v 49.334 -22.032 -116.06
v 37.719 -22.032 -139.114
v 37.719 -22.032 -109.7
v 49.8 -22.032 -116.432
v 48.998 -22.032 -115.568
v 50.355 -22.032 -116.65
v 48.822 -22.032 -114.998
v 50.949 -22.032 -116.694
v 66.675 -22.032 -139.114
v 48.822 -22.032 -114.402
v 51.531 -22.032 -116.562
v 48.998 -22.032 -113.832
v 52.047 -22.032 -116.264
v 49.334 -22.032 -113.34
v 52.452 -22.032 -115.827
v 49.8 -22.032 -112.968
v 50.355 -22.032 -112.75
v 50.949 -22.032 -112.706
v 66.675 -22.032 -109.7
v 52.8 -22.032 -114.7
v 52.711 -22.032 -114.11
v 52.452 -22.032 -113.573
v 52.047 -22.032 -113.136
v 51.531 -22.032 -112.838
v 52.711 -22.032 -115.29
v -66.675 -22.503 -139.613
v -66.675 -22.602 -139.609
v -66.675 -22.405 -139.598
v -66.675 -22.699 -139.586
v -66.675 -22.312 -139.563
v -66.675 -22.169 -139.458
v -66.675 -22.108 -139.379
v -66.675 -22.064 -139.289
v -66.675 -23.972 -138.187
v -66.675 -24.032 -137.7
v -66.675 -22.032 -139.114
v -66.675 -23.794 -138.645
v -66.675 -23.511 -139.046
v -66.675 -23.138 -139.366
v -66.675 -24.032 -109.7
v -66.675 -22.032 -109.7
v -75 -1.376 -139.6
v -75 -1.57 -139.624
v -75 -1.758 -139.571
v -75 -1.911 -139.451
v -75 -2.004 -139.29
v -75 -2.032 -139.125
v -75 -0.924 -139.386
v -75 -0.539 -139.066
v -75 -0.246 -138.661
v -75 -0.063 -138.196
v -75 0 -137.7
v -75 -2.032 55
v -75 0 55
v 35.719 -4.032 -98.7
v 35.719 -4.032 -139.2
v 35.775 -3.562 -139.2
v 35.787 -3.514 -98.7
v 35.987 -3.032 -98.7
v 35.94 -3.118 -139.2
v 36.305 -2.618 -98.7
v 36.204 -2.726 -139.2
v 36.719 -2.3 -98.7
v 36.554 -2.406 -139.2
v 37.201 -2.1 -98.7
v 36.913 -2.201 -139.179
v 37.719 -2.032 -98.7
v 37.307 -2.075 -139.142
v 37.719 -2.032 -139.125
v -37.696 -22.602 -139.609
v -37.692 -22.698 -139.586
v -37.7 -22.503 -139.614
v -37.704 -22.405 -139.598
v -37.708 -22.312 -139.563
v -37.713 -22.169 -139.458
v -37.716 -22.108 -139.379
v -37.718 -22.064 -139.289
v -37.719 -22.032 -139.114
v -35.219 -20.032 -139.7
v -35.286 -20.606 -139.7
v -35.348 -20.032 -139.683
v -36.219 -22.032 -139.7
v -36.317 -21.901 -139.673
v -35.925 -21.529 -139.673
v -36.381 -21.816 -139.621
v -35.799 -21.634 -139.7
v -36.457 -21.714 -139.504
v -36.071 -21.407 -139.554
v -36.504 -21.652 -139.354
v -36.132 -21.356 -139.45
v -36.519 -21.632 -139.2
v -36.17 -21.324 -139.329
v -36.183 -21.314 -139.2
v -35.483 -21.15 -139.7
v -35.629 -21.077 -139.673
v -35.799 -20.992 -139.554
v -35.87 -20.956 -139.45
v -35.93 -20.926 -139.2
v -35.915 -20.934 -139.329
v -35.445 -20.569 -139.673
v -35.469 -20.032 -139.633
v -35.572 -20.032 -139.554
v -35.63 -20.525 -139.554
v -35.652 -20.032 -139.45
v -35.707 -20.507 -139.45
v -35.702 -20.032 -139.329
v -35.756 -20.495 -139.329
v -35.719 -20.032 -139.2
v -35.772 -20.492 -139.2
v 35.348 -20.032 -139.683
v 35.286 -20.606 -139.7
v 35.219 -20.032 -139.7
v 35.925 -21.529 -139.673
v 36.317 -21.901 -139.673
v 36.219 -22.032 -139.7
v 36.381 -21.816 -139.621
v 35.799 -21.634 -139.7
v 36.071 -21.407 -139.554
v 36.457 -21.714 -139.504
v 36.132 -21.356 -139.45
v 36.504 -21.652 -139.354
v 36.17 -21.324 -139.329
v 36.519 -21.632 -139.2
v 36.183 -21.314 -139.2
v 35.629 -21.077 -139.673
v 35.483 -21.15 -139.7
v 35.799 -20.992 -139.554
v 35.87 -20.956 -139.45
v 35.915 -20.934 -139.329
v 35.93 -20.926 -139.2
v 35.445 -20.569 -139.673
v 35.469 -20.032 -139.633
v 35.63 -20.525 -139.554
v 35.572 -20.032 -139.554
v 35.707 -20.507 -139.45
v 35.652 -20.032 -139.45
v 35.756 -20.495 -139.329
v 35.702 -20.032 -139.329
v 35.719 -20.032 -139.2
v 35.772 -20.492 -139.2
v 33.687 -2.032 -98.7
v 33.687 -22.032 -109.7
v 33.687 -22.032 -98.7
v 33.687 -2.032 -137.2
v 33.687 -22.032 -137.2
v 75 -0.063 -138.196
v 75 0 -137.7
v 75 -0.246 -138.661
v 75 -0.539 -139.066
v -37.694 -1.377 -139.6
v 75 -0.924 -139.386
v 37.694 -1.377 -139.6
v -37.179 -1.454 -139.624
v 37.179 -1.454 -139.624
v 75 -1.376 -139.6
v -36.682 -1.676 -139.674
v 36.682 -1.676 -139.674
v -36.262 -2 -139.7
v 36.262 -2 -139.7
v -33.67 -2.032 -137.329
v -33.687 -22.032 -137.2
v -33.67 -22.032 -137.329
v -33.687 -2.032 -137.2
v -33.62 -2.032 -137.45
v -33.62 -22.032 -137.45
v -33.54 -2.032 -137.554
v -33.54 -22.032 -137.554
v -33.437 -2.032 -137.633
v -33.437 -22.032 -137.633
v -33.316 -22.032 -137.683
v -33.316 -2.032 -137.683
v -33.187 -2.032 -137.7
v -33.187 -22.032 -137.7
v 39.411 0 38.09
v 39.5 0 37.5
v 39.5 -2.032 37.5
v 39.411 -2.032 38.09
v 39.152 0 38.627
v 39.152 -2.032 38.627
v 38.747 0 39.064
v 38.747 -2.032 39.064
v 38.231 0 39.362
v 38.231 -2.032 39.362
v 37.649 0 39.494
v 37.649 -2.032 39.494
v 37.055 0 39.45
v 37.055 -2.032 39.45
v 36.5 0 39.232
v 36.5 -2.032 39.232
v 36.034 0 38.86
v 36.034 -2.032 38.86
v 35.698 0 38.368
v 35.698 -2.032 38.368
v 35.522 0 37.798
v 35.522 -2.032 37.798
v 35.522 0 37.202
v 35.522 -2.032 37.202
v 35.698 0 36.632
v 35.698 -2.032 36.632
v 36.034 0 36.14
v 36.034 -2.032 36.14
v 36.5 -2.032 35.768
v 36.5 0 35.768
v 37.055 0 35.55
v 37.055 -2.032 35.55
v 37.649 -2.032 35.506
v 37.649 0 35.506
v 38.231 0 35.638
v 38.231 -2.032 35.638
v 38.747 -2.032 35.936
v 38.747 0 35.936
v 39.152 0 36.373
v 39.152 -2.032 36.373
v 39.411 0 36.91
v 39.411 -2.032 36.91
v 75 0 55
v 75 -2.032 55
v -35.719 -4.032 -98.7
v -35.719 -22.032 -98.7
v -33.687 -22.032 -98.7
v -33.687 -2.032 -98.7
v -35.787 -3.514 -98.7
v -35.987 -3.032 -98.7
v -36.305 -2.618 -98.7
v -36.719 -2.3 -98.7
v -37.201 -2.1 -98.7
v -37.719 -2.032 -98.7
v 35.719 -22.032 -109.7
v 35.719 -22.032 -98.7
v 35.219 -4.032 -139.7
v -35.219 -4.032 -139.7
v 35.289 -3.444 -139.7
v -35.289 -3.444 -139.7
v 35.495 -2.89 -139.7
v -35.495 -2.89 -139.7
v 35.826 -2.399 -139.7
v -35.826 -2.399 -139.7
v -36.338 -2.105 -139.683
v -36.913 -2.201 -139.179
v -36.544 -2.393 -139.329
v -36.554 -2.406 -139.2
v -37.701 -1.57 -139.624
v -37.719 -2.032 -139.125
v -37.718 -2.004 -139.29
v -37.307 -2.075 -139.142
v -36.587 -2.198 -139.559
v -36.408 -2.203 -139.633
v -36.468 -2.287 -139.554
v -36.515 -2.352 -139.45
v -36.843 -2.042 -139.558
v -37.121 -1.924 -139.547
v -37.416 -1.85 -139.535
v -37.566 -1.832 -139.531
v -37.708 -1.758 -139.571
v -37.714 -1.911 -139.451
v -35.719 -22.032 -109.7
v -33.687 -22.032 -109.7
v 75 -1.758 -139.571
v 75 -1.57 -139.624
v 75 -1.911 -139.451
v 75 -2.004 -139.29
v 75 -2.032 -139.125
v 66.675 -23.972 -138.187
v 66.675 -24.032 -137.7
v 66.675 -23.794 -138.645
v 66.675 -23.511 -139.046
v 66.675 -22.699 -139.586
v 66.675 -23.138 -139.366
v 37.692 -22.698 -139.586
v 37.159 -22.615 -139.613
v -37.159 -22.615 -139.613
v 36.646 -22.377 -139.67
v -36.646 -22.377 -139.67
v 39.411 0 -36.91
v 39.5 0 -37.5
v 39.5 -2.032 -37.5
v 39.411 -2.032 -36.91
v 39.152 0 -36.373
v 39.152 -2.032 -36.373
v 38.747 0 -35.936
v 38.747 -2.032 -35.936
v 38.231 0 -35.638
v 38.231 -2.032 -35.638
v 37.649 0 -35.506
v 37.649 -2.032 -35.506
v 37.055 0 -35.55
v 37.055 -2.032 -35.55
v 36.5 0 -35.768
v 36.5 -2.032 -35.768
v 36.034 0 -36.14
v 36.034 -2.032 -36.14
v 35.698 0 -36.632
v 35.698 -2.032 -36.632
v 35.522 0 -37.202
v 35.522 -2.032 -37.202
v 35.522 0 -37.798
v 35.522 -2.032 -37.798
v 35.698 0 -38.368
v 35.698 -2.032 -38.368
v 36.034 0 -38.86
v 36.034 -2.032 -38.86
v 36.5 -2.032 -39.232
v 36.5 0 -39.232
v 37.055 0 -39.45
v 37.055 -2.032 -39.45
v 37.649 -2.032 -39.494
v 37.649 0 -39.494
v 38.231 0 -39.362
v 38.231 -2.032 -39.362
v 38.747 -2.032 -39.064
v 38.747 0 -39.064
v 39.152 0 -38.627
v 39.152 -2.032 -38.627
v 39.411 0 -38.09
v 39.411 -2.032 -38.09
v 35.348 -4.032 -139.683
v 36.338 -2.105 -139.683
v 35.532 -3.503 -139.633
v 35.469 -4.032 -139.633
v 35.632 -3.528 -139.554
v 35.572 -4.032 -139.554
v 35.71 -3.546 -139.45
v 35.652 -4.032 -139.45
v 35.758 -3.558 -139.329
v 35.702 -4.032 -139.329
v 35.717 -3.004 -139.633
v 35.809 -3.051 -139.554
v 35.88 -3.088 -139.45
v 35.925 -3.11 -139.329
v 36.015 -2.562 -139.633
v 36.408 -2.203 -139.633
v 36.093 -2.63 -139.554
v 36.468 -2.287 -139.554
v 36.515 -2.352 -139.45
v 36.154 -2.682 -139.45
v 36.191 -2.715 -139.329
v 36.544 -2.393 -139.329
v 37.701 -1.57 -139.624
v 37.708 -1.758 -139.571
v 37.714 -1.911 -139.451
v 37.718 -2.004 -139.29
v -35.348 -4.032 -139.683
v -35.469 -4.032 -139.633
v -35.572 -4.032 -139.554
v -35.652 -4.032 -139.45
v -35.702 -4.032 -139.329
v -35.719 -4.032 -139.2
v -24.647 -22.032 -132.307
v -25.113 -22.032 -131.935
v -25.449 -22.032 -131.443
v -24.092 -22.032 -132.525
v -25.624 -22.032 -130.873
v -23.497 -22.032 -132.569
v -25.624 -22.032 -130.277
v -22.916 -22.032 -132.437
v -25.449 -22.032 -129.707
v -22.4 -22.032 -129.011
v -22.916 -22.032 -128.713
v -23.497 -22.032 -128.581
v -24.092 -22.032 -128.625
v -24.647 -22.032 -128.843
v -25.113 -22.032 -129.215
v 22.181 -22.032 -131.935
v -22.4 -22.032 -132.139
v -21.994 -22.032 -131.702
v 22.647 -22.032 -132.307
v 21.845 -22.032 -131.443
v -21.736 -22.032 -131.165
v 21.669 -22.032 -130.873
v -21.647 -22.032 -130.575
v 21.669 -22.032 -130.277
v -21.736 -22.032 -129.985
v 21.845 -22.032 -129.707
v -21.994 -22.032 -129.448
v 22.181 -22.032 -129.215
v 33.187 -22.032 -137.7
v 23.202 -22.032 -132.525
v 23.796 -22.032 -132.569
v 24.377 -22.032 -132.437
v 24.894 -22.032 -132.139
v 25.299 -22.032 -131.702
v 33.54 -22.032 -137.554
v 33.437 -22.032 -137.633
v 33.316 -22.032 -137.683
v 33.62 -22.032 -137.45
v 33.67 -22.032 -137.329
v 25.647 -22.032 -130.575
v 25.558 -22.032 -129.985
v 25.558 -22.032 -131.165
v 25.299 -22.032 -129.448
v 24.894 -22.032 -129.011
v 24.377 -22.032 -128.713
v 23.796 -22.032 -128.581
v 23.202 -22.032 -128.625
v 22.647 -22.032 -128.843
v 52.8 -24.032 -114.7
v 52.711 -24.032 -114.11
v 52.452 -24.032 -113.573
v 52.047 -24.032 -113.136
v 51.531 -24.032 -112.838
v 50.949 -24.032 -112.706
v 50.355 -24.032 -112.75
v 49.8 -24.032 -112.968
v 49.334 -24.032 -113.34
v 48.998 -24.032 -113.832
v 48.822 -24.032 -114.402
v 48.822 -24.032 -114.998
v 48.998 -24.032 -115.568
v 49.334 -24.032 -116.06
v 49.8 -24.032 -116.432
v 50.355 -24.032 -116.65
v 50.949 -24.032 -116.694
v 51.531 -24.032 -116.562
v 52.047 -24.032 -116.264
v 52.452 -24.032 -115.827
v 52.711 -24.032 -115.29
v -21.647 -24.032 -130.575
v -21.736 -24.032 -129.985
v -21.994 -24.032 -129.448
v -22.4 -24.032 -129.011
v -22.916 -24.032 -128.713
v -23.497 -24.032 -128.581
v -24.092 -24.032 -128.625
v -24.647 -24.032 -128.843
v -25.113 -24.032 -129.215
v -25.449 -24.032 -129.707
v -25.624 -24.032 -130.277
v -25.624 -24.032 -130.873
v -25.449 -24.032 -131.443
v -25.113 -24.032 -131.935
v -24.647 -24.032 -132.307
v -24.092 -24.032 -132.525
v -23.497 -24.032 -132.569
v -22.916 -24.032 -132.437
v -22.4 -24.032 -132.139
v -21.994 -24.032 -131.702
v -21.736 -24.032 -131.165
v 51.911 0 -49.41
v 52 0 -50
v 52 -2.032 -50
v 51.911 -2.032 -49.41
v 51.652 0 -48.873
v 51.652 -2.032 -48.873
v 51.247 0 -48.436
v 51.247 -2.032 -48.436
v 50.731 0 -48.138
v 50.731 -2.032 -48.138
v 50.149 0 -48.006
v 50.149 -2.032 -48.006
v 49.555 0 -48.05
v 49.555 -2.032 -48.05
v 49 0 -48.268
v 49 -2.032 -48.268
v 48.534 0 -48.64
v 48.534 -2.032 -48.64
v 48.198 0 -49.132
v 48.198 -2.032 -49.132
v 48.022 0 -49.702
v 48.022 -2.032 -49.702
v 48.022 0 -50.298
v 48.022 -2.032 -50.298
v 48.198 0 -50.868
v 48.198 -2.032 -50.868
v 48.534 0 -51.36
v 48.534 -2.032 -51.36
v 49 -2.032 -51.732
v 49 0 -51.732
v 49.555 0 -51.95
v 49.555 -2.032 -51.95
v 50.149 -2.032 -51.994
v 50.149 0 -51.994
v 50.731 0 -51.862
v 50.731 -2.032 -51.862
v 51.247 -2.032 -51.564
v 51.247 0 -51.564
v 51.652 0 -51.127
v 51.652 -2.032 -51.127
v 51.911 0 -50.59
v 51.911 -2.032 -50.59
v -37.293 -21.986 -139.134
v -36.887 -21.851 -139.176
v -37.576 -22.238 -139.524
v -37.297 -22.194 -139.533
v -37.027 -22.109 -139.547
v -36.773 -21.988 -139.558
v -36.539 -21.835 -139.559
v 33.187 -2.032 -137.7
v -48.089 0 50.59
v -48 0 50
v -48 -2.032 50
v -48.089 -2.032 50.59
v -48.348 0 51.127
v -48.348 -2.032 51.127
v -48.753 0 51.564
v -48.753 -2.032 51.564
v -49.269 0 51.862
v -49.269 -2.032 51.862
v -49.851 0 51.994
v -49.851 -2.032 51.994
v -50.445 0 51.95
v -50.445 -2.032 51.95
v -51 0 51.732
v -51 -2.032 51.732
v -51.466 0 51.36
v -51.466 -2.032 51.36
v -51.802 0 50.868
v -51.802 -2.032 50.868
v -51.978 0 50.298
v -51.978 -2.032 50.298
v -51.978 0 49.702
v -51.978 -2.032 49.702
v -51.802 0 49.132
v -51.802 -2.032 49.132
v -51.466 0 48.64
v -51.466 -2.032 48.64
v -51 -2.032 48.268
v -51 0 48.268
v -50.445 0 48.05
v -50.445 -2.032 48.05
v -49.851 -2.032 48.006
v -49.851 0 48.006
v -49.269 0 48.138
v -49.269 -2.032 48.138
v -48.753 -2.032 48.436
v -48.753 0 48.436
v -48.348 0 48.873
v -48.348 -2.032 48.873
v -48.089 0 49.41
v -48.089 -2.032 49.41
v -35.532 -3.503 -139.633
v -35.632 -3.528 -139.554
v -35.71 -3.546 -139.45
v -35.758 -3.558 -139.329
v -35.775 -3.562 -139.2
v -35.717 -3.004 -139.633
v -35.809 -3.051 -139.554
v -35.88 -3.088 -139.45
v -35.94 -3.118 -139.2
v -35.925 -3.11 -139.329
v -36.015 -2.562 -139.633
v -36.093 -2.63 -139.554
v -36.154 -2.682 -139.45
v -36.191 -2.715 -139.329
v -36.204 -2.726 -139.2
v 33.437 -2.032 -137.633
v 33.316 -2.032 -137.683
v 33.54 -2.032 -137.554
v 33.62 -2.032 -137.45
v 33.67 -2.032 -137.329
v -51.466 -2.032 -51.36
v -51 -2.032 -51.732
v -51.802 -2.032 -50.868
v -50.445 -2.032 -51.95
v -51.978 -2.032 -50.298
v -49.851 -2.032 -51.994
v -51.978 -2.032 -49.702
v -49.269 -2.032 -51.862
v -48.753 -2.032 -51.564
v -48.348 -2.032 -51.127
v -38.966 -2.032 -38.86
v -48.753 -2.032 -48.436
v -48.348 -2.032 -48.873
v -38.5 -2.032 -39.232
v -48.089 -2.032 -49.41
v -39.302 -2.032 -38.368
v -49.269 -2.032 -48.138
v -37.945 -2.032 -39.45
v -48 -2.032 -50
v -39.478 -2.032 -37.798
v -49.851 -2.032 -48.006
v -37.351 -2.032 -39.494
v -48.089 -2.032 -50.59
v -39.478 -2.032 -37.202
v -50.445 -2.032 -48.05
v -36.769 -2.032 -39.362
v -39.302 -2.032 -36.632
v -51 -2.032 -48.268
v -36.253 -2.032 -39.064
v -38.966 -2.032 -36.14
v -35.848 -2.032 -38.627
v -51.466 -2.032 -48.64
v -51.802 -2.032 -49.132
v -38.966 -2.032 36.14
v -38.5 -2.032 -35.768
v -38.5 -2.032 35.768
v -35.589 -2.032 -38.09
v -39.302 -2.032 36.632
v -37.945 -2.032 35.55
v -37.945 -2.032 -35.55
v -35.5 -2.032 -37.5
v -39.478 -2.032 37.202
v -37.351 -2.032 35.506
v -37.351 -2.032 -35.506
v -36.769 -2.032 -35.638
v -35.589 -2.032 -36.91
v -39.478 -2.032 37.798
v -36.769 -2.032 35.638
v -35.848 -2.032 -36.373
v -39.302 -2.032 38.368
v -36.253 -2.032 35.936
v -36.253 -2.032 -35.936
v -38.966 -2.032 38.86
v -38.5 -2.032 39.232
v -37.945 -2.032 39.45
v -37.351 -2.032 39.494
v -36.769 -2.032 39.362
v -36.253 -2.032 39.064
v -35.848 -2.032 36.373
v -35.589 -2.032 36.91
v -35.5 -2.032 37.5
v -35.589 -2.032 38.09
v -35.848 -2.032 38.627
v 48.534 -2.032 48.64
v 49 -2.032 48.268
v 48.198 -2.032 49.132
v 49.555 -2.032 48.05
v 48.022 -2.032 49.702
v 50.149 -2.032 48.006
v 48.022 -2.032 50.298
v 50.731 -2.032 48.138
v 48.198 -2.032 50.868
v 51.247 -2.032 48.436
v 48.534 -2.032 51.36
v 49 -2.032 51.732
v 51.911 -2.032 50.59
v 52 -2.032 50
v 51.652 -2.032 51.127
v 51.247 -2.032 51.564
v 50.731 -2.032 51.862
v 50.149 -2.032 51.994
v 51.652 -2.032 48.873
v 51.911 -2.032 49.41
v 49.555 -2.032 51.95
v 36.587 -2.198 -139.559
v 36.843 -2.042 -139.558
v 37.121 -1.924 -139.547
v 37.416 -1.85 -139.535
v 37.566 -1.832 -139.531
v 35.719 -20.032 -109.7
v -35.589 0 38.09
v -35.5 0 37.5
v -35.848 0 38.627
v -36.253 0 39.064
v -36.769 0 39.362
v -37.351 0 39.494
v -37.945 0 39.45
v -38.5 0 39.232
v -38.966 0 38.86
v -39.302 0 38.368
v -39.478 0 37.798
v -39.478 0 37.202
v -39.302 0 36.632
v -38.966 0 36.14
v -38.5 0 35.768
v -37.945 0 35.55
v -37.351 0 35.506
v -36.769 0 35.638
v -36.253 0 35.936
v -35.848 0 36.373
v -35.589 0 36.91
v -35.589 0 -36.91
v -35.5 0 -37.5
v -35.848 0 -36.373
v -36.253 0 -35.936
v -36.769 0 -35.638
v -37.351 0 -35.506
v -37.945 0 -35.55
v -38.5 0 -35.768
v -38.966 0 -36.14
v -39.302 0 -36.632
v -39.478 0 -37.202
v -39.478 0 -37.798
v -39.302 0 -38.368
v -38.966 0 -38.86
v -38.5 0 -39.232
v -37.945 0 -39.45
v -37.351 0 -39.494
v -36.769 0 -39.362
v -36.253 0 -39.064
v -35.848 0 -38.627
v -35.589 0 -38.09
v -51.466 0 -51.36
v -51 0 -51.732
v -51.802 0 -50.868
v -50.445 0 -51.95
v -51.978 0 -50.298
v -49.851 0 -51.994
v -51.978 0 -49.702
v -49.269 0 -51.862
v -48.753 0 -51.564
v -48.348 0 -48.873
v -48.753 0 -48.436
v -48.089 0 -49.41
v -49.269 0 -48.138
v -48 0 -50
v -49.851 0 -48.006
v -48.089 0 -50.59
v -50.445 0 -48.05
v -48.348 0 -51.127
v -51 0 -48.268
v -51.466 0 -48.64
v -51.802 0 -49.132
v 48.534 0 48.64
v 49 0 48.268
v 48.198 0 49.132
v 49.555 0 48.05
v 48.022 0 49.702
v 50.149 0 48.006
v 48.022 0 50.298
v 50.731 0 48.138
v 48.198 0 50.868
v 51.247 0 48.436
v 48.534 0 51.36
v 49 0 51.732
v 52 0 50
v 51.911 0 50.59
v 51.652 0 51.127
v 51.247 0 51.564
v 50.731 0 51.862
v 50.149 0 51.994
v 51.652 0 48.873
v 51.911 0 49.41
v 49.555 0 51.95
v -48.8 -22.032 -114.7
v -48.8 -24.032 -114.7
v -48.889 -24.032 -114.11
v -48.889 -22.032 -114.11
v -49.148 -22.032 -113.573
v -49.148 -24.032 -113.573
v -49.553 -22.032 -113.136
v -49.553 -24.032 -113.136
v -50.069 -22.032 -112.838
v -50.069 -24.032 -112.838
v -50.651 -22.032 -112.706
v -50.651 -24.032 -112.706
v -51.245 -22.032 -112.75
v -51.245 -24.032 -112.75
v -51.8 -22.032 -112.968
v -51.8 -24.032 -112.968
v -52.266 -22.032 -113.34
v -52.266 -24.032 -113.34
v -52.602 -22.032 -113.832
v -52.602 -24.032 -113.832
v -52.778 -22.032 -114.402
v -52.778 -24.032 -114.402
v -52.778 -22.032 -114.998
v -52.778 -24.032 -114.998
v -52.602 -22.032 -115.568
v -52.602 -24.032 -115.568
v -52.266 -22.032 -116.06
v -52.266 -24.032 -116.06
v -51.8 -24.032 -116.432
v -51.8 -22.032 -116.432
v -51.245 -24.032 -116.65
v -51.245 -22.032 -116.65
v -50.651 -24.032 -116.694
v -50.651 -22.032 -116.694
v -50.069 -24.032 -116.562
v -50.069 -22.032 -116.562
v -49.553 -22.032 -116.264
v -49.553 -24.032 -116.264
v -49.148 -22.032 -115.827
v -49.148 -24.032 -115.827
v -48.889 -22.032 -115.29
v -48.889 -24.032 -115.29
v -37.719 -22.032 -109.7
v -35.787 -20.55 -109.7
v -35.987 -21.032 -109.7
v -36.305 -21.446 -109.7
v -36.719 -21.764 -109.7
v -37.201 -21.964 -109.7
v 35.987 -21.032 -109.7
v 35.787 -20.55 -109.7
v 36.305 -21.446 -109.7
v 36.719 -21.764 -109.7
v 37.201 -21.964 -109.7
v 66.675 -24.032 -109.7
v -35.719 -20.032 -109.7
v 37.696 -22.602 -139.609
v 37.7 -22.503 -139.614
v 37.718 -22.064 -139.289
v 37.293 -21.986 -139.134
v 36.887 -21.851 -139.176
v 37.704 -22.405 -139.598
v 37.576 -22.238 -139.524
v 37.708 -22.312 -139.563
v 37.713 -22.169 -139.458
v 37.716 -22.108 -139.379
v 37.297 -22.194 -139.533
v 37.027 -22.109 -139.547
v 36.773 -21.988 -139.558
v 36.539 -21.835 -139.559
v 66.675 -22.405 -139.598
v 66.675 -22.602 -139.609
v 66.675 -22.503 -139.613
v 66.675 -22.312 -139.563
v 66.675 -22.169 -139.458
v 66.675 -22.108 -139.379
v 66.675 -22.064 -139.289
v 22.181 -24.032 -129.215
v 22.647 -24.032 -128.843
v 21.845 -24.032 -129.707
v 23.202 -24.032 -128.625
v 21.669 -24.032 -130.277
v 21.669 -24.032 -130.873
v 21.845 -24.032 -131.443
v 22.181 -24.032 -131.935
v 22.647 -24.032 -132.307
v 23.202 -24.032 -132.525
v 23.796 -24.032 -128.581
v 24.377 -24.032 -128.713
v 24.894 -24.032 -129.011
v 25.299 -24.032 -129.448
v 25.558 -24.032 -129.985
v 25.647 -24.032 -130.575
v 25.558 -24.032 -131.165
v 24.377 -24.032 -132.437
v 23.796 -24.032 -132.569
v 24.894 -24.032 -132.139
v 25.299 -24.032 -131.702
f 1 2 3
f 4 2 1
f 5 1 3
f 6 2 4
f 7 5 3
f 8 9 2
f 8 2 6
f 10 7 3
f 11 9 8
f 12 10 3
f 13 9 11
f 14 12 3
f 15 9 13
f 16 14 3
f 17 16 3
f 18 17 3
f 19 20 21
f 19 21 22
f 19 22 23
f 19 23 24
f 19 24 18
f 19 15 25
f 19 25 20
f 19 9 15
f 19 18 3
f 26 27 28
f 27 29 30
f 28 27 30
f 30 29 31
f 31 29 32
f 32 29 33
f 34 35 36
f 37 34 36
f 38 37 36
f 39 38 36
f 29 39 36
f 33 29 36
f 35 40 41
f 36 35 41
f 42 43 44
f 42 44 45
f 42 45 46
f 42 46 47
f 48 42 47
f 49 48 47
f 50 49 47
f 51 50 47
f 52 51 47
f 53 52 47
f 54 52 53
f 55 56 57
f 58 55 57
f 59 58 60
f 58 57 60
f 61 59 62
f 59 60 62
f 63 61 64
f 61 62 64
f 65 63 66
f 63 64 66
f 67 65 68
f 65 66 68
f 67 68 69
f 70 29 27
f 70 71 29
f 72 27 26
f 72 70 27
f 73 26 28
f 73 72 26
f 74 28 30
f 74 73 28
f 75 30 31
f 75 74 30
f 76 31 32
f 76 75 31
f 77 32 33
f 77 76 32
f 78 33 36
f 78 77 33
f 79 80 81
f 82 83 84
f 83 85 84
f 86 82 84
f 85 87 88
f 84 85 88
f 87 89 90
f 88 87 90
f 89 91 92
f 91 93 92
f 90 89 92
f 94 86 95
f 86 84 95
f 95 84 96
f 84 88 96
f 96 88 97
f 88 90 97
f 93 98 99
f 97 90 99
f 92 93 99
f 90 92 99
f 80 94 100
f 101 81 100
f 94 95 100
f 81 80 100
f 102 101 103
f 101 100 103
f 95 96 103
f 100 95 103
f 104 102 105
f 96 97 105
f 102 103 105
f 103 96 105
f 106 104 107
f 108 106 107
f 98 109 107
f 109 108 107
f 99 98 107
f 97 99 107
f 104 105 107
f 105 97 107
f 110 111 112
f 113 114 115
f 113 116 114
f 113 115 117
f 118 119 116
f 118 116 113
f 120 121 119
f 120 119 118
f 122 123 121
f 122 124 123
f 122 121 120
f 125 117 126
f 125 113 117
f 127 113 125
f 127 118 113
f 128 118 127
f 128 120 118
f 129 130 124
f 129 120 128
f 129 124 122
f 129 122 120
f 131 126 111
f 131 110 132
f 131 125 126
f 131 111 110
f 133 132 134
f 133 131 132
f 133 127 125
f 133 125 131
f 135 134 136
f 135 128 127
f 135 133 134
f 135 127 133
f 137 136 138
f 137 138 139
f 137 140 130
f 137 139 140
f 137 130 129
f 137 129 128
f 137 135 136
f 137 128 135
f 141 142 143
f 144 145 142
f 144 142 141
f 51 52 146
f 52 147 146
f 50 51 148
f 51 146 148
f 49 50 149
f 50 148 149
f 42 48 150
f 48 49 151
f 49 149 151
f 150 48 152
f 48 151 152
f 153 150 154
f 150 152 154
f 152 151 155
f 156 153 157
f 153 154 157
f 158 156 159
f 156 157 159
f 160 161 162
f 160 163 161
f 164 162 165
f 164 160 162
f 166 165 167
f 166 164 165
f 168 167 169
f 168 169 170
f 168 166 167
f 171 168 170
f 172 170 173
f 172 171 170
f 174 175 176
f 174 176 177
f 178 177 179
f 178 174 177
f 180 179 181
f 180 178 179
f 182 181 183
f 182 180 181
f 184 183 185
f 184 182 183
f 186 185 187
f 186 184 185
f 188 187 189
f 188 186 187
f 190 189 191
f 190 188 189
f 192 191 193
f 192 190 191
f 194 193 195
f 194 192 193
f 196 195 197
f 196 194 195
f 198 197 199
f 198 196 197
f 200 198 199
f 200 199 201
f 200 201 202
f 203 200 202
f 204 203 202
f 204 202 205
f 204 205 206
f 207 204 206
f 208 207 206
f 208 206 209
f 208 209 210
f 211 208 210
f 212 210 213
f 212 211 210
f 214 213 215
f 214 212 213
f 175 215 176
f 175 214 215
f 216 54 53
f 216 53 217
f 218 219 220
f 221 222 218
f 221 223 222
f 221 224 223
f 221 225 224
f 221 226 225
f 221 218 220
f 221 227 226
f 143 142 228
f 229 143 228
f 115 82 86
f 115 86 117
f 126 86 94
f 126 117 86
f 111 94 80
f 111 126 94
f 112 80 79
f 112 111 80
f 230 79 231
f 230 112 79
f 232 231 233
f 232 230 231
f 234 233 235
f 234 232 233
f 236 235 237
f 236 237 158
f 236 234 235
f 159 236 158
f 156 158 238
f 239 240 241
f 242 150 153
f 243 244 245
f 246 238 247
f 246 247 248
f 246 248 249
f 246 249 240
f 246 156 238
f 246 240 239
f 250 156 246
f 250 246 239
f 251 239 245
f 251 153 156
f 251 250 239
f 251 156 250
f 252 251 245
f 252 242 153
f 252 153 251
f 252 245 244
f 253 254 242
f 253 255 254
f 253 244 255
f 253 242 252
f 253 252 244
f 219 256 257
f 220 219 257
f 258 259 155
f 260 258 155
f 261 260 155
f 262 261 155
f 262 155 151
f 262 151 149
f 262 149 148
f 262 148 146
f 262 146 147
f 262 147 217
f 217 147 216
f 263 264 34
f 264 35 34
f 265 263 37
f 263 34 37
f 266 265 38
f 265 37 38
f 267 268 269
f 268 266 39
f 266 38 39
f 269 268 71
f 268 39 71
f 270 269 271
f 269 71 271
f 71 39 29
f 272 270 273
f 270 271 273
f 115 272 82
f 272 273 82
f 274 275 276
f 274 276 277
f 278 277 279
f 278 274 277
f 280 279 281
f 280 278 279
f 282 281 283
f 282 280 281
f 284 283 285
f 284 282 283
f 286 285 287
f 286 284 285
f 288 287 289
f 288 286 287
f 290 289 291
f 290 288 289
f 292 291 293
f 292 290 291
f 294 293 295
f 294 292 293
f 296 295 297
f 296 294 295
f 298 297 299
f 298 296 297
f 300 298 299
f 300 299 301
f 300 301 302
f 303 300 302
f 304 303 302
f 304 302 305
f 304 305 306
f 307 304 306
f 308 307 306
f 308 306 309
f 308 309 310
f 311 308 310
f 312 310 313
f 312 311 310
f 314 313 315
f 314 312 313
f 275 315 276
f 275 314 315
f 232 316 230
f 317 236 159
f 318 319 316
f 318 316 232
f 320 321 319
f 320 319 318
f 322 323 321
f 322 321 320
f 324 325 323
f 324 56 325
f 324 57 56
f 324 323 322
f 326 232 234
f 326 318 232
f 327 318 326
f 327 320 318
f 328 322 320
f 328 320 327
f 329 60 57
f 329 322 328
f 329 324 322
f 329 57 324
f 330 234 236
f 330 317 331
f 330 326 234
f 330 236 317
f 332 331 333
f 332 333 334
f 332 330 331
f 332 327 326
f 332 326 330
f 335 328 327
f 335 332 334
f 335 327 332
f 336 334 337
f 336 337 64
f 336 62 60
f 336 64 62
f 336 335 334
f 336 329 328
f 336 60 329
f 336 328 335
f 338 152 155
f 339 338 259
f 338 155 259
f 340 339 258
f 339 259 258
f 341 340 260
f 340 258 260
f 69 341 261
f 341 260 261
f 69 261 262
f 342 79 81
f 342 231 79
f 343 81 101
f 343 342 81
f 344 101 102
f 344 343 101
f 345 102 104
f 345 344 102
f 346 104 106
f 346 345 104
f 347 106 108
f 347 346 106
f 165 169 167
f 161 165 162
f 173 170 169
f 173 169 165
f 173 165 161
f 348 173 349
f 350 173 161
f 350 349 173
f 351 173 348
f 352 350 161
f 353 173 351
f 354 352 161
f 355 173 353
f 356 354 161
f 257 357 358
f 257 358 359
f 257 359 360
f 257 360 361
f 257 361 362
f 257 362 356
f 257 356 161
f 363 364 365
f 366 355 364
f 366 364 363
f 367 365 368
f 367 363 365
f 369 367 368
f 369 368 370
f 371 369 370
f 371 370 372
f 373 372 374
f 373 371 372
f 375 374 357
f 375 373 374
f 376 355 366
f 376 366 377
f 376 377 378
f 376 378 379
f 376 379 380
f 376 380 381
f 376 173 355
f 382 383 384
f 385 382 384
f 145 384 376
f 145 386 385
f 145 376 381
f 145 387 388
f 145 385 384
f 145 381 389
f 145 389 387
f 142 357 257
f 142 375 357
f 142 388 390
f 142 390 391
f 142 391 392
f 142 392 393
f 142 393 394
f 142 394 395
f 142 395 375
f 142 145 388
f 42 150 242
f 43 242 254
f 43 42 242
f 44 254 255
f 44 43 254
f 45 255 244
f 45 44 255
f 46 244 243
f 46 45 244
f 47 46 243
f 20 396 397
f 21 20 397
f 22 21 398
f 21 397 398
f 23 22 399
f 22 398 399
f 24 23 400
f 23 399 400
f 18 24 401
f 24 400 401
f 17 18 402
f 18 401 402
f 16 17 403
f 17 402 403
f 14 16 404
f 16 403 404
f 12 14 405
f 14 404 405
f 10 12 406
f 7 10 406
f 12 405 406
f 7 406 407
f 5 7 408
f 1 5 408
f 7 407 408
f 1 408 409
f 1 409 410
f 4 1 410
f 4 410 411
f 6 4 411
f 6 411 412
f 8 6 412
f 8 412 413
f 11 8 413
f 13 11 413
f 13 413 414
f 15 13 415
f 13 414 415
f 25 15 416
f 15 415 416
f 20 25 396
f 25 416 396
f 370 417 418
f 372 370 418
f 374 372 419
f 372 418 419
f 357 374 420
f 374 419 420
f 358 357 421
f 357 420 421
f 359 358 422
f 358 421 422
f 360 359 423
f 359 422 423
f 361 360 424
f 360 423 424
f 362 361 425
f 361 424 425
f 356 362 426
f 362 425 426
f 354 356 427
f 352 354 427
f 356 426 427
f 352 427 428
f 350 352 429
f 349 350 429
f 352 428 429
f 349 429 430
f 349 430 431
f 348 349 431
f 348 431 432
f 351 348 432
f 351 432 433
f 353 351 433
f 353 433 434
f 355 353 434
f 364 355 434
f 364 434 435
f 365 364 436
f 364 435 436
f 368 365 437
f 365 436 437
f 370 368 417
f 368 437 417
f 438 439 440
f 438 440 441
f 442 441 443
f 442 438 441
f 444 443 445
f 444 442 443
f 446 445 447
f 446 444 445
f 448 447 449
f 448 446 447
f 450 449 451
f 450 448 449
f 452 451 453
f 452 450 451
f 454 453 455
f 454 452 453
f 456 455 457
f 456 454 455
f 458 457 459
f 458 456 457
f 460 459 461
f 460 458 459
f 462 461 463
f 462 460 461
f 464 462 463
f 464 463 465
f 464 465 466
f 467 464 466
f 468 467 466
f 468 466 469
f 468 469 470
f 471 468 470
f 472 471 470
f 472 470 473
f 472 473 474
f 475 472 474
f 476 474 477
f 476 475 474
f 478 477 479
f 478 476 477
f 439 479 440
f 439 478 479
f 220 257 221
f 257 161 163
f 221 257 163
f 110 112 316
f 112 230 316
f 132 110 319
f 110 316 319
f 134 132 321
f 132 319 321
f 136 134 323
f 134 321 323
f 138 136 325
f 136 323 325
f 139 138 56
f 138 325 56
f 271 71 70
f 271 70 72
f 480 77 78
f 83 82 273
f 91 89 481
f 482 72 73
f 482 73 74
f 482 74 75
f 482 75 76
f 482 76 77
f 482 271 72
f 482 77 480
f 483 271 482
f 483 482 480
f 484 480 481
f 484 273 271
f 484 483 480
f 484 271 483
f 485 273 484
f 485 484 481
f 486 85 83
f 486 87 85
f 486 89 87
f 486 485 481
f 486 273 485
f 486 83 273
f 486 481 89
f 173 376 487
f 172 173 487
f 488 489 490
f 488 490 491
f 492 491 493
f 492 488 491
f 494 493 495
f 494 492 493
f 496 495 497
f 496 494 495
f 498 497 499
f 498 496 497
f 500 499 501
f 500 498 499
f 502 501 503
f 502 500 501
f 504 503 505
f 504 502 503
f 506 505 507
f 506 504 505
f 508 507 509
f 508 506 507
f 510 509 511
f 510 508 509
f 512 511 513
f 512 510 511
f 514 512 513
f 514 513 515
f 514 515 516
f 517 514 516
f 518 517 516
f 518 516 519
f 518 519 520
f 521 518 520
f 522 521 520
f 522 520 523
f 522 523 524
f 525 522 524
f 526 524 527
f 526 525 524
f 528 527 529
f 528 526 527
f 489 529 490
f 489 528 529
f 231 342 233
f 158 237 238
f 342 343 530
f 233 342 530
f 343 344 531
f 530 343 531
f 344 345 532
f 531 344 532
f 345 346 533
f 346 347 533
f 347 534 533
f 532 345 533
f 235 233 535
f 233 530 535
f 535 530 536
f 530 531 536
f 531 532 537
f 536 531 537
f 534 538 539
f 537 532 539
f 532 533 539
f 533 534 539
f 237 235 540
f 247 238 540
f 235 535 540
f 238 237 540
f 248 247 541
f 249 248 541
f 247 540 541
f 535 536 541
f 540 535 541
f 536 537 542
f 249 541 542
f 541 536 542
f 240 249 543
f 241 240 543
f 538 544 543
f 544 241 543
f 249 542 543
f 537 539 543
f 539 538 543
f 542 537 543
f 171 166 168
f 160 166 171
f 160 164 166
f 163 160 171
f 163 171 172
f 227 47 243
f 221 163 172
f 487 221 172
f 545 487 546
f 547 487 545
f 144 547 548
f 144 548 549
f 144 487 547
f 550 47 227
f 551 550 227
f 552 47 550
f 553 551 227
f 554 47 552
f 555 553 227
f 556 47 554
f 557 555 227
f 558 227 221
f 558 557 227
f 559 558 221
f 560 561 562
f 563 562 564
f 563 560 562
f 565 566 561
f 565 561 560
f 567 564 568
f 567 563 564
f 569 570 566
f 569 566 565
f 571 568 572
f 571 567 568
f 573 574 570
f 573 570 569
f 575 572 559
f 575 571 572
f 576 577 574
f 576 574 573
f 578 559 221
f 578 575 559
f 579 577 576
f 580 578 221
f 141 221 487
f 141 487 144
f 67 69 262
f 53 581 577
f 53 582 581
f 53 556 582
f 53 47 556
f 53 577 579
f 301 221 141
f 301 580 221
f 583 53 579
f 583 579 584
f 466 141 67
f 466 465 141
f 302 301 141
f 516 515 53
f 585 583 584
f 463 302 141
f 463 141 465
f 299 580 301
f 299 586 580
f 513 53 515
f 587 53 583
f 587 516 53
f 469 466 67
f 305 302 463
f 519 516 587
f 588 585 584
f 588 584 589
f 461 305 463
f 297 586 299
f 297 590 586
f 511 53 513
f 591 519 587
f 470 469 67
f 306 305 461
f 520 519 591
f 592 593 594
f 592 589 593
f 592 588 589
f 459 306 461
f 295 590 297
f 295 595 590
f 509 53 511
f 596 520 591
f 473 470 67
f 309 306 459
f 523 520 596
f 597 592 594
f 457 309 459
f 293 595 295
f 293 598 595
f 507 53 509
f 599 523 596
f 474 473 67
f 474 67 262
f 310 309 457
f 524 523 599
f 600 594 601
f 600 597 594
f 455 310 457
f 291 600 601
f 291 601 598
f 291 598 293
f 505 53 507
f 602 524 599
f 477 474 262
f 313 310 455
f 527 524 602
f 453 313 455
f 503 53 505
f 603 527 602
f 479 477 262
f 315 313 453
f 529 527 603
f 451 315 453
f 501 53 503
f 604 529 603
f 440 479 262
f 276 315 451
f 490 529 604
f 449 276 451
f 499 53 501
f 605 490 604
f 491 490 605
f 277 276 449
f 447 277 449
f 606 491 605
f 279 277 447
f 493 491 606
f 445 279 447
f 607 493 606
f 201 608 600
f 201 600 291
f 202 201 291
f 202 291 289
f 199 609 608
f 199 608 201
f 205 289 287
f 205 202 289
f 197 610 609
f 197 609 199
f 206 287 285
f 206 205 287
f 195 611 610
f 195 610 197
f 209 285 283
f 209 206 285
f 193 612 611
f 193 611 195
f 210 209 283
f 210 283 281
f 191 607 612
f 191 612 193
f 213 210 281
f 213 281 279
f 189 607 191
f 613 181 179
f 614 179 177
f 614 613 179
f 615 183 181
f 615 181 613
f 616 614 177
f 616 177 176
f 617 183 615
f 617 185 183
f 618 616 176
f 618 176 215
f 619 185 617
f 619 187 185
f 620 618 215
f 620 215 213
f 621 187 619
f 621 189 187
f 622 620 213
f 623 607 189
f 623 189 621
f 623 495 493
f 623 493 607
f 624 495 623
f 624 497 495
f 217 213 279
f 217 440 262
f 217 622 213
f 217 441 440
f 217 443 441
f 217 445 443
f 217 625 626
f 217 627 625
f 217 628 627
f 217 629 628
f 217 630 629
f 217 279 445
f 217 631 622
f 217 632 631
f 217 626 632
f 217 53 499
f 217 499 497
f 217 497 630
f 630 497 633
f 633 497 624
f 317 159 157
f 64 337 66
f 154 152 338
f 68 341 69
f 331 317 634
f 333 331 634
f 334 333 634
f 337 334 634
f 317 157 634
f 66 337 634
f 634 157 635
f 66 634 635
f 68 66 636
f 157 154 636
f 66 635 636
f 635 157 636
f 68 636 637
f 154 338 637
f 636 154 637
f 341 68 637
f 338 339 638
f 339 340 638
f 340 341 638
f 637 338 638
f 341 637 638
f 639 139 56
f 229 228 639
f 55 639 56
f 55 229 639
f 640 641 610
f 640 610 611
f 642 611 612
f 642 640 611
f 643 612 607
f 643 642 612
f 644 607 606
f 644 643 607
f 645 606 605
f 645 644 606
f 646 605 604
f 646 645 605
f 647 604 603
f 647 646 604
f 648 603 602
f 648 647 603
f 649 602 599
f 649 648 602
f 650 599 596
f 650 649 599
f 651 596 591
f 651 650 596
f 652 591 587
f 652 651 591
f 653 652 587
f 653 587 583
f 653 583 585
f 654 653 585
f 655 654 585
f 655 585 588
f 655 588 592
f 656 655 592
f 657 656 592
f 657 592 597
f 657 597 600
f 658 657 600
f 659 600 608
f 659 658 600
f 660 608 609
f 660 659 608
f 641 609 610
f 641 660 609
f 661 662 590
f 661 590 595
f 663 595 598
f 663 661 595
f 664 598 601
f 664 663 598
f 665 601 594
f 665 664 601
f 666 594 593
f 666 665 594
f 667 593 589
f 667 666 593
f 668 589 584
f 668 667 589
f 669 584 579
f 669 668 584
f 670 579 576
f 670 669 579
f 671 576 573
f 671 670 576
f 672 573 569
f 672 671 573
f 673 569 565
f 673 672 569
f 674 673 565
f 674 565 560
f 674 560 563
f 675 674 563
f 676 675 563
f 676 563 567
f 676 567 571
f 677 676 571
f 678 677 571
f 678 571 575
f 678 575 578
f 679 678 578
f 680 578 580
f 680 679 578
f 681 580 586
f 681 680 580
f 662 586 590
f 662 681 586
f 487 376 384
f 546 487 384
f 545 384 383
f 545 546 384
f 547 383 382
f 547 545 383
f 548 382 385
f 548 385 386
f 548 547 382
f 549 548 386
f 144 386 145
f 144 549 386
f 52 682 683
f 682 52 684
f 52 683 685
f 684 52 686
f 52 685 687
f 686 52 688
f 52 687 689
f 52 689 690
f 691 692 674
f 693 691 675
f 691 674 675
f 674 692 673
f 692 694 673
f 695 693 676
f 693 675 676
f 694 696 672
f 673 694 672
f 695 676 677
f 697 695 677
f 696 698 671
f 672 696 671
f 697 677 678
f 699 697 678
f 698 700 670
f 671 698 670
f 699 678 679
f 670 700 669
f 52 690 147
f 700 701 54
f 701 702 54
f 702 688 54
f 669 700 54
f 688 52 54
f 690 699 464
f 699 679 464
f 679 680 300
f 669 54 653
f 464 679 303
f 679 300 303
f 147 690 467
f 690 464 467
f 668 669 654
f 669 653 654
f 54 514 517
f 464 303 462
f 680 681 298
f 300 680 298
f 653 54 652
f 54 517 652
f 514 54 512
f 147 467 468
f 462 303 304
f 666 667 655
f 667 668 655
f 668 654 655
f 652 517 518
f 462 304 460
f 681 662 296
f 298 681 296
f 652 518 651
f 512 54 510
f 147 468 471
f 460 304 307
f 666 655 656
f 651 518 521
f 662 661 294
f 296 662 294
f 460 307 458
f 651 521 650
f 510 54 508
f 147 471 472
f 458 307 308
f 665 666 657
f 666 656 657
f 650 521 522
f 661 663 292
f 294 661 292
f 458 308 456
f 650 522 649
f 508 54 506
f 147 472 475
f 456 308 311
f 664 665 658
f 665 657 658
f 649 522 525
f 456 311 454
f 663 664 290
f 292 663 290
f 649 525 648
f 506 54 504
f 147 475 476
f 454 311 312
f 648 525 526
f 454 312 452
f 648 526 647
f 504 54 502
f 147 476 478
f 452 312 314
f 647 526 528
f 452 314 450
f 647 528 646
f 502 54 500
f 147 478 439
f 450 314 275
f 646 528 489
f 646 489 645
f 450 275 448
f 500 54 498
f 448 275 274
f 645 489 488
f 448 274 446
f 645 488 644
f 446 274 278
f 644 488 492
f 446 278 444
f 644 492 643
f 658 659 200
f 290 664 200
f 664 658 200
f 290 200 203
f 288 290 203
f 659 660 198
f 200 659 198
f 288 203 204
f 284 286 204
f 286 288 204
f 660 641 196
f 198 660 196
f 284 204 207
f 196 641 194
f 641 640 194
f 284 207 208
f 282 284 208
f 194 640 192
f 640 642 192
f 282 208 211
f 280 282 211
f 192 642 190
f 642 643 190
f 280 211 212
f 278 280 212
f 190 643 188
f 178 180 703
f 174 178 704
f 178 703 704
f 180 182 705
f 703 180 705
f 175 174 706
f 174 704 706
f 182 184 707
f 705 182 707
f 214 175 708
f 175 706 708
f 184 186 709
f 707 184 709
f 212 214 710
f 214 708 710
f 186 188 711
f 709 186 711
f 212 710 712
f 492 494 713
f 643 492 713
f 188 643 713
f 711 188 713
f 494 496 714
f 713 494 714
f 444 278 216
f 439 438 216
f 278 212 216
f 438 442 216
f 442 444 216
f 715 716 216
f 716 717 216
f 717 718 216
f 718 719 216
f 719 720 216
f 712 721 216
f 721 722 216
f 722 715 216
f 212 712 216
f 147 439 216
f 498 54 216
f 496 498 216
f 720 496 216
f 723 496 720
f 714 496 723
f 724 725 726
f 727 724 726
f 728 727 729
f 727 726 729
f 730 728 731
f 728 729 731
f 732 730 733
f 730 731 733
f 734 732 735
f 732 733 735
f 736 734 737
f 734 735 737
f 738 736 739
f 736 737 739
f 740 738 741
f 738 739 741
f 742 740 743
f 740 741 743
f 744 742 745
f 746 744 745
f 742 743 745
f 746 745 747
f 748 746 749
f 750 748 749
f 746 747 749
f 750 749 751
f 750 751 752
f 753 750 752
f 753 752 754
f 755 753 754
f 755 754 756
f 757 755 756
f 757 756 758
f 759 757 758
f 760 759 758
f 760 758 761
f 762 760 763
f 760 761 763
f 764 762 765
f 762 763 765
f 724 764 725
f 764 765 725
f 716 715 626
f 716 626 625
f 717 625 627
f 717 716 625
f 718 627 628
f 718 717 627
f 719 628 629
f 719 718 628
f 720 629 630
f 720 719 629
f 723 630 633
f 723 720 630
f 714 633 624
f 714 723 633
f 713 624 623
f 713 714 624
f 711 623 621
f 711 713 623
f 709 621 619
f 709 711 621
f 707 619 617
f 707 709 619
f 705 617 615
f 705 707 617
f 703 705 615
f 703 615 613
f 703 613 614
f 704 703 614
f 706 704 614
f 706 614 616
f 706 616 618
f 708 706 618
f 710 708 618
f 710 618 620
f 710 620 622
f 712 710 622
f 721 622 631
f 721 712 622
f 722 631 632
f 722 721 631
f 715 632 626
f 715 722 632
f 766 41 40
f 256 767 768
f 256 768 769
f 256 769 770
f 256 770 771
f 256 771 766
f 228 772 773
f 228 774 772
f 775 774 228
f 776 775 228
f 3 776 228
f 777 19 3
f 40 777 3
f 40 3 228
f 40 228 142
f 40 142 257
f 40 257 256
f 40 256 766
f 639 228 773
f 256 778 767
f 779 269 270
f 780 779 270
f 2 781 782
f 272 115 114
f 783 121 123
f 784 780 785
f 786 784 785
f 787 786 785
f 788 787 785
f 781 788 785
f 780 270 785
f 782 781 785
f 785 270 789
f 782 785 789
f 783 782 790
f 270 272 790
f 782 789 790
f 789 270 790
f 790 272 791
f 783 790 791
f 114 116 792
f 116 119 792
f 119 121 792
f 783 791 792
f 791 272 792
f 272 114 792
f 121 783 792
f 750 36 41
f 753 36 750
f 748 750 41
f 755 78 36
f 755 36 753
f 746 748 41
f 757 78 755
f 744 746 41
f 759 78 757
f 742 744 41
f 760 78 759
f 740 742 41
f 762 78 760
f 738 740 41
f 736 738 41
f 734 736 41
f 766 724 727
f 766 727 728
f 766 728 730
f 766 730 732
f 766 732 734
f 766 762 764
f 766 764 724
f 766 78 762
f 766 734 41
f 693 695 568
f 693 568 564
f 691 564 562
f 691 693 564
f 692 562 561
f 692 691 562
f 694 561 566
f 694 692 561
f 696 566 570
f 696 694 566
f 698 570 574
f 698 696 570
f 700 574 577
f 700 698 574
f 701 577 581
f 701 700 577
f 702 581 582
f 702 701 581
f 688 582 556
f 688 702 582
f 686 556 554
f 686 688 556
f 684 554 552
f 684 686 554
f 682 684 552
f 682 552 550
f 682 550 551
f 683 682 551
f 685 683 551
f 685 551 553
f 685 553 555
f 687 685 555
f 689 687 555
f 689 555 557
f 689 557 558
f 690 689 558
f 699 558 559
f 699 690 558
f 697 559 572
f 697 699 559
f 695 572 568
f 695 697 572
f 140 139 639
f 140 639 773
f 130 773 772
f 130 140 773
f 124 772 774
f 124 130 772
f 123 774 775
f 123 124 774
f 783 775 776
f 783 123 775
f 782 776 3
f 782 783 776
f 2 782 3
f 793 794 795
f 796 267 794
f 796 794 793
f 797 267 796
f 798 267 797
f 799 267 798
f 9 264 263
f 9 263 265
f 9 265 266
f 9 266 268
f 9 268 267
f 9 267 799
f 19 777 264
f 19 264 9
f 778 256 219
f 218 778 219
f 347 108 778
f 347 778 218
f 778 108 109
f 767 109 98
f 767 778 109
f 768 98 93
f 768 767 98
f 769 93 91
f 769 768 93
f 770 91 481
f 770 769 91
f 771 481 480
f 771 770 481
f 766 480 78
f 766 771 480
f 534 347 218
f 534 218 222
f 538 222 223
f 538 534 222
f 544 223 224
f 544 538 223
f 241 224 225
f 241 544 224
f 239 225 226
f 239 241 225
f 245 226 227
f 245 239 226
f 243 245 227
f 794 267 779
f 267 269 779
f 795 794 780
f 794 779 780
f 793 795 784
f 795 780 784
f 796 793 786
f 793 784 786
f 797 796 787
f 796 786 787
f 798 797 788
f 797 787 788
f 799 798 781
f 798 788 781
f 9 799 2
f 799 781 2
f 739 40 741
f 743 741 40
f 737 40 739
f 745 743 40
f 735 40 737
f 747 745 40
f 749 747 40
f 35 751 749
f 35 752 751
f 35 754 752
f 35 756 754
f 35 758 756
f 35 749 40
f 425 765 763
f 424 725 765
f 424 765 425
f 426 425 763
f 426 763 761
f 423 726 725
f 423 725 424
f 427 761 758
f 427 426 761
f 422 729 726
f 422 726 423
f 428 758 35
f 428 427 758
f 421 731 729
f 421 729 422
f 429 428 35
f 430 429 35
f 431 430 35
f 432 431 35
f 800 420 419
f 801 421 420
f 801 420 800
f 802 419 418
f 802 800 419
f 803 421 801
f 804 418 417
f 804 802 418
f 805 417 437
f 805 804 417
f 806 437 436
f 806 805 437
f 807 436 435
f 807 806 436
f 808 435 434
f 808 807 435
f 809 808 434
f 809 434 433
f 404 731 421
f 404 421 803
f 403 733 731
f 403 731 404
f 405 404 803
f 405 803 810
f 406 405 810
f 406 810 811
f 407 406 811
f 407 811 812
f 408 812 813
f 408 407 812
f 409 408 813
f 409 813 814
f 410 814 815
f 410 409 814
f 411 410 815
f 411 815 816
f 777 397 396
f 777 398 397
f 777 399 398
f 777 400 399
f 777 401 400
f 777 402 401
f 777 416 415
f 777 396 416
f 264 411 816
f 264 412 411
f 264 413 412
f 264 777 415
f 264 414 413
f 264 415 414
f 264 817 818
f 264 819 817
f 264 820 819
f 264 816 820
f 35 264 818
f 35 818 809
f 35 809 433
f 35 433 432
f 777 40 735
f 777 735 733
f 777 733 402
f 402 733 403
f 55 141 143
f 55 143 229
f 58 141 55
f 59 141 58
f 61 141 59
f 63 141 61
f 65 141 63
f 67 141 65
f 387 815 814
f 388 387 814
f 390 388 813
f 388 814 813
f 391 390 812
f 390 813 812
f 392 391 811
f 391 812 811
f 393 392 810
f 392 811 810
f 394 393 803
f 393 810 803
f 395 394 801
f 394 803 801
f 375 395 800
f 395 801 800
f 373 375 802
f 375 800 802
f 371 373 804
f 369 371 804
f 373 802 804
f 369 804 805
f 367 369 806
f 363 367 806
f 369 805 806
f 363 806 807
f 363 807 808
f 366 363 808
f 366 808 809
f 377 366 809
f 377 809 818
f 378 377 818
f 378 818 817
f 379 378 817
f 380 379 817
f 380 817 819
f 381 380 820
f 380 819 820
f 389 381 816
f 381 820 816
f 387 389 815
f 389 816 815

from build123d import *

# Parameters (mm, degrees)
F0_W     = 150
F0_H     = 194.7
F0_R     = 2
F1_DEPTH = 2.032
F2_W     = 20
F2_H     = 2
F3_DEPTH = 35.71875
F4_DEPTH = 66.675
F5_R     = 2
F6_DEPTH = 2
F7_W     = 2.032
F7_H     = 20
F8_DEPTH = 39
F9_R     = 2
F10_R    = 1.99999
F11_R    = 0.5


# Not quite as in the source:
# - a fillet or chamfer is up to 0.001 mm smaller than in the source, because OpenCascade refuses the exact size


with BuildPart() as f1:
    # F0 (on Front) → F1 (new body)
    with BuildSketch(Plane.XZ):
        with Locations((0, -42.35)):
            Rectangle(F0_W, F0_H)
        with Locations((-50, -50)):
            Circle(F0_R, mode=Mode.SUBTRACT)
        with Locations((50, -50)):
            Circle(F0_R, mode=Mode.SUBTRACT)
        with Locations((-37.5, -37.5)):
            Circle(F0_R, mode=Mode.SUBTRACT)
        with Locations((-50, 50)):
            Circle(F0_R, mode=Mode.SUBTRACT)
        with Locations((-37.5, 37.5)):
            Circle(F0_R, mode=Mode.SUBTRACT)
        with Locations((37.5, -37.5)):
            Circle(F0_R, mode=Mode.SUBTRACT)
        with Locations((37.5, 37.5)):
            Circle(F0_R, mode=Mode.SUBTRACT)
        with Locations((50, 50)):
            Circle(F0_R, mode=Mode.SUBTRACT)
    extrude(amount=F1_DEPTH)

    # F2 (on Right) → F3 (join, symmetric)
    with BuildSketch(Plane.YZ):
        with Locations((-12.032, -138.7)):
            Rectangle(F2_W, F2_H)
    extrude(amount=F3_DEPTH, both=True)

    # F2 (on Right) → F4 (join, symmetric)
    with BuildSketch(Plane.YZ):
        Polygon((-24.032, -139.7), (-22.032, -139.7), (-22.032, -137.7), (-22.032, -109.7), (-24.032, -109.7), align=None)
    extrude(amount=F4_DEPTH, both=True)

    # F5 (on face) → F6 (cut, through all)
    with BuildSketch(Plane.XZ.offset(24.032)):
        with Locations((-50.8, -114.7)):
            Circle(F5_R)
        with Locations((-23.6466728747, -130.575)):
            Circle(F5_R)
        with Locations((50.8, -114.7)):
            Circle(F5_R)
        with Locations((23.6466728747, -130.575)):
            Circle(F5_R)
    extrude(amount=-F6_DEPTH, mode=Mode.SUBTRACT)

    # F7 (on face) → F8 (join)
    with BuildSketch(Plane.XY.offset(-137.7)):
        with Locations((-34.70275, -12.032)):
            Rectangle(F7_W, F7_H)
        with Locations((34.70275, -12.032)):
            Rectangle(F7_W, F7_H)
    extrude(amount=F8_DEPTH)

    # F9
    f9_edges = [f1.edges().sort_by_distance(p)[0] for p in [
        (35.71875, -2.032, -119.2),
        (35.71875, -22.032, -124.7),
        (-35.71875, -2.032, -119.2),
        (-35.71875, -22.032, -124.7),
    ]]
    fillet(f9_edges, radius=F9_R)

    # F10 (radius 2 in the source; OpenCascade refuses exactly that, so slightly less here)
    f10_edges = [f1.edges().sort_by_distance(p)[0] for p in [
        (0, 0, -139.7),
        (0, -24.032, -139.7),
    ]]
    fillet(f10_edges, radius=F10_R)

    # F11
    f11_edges = [f1.edges().sort_by_distance(p)[0] for p in [
        (-35.71875, -12.032, -139.7),
        (35.71875, -12.032, -139.7),
        (33.68675, -12.032, -137.7),
        (-33.68675, -12.032, -137.7),
    ]]
    fillet(f11_edges, radius=F11_R)


solid = f1.part
